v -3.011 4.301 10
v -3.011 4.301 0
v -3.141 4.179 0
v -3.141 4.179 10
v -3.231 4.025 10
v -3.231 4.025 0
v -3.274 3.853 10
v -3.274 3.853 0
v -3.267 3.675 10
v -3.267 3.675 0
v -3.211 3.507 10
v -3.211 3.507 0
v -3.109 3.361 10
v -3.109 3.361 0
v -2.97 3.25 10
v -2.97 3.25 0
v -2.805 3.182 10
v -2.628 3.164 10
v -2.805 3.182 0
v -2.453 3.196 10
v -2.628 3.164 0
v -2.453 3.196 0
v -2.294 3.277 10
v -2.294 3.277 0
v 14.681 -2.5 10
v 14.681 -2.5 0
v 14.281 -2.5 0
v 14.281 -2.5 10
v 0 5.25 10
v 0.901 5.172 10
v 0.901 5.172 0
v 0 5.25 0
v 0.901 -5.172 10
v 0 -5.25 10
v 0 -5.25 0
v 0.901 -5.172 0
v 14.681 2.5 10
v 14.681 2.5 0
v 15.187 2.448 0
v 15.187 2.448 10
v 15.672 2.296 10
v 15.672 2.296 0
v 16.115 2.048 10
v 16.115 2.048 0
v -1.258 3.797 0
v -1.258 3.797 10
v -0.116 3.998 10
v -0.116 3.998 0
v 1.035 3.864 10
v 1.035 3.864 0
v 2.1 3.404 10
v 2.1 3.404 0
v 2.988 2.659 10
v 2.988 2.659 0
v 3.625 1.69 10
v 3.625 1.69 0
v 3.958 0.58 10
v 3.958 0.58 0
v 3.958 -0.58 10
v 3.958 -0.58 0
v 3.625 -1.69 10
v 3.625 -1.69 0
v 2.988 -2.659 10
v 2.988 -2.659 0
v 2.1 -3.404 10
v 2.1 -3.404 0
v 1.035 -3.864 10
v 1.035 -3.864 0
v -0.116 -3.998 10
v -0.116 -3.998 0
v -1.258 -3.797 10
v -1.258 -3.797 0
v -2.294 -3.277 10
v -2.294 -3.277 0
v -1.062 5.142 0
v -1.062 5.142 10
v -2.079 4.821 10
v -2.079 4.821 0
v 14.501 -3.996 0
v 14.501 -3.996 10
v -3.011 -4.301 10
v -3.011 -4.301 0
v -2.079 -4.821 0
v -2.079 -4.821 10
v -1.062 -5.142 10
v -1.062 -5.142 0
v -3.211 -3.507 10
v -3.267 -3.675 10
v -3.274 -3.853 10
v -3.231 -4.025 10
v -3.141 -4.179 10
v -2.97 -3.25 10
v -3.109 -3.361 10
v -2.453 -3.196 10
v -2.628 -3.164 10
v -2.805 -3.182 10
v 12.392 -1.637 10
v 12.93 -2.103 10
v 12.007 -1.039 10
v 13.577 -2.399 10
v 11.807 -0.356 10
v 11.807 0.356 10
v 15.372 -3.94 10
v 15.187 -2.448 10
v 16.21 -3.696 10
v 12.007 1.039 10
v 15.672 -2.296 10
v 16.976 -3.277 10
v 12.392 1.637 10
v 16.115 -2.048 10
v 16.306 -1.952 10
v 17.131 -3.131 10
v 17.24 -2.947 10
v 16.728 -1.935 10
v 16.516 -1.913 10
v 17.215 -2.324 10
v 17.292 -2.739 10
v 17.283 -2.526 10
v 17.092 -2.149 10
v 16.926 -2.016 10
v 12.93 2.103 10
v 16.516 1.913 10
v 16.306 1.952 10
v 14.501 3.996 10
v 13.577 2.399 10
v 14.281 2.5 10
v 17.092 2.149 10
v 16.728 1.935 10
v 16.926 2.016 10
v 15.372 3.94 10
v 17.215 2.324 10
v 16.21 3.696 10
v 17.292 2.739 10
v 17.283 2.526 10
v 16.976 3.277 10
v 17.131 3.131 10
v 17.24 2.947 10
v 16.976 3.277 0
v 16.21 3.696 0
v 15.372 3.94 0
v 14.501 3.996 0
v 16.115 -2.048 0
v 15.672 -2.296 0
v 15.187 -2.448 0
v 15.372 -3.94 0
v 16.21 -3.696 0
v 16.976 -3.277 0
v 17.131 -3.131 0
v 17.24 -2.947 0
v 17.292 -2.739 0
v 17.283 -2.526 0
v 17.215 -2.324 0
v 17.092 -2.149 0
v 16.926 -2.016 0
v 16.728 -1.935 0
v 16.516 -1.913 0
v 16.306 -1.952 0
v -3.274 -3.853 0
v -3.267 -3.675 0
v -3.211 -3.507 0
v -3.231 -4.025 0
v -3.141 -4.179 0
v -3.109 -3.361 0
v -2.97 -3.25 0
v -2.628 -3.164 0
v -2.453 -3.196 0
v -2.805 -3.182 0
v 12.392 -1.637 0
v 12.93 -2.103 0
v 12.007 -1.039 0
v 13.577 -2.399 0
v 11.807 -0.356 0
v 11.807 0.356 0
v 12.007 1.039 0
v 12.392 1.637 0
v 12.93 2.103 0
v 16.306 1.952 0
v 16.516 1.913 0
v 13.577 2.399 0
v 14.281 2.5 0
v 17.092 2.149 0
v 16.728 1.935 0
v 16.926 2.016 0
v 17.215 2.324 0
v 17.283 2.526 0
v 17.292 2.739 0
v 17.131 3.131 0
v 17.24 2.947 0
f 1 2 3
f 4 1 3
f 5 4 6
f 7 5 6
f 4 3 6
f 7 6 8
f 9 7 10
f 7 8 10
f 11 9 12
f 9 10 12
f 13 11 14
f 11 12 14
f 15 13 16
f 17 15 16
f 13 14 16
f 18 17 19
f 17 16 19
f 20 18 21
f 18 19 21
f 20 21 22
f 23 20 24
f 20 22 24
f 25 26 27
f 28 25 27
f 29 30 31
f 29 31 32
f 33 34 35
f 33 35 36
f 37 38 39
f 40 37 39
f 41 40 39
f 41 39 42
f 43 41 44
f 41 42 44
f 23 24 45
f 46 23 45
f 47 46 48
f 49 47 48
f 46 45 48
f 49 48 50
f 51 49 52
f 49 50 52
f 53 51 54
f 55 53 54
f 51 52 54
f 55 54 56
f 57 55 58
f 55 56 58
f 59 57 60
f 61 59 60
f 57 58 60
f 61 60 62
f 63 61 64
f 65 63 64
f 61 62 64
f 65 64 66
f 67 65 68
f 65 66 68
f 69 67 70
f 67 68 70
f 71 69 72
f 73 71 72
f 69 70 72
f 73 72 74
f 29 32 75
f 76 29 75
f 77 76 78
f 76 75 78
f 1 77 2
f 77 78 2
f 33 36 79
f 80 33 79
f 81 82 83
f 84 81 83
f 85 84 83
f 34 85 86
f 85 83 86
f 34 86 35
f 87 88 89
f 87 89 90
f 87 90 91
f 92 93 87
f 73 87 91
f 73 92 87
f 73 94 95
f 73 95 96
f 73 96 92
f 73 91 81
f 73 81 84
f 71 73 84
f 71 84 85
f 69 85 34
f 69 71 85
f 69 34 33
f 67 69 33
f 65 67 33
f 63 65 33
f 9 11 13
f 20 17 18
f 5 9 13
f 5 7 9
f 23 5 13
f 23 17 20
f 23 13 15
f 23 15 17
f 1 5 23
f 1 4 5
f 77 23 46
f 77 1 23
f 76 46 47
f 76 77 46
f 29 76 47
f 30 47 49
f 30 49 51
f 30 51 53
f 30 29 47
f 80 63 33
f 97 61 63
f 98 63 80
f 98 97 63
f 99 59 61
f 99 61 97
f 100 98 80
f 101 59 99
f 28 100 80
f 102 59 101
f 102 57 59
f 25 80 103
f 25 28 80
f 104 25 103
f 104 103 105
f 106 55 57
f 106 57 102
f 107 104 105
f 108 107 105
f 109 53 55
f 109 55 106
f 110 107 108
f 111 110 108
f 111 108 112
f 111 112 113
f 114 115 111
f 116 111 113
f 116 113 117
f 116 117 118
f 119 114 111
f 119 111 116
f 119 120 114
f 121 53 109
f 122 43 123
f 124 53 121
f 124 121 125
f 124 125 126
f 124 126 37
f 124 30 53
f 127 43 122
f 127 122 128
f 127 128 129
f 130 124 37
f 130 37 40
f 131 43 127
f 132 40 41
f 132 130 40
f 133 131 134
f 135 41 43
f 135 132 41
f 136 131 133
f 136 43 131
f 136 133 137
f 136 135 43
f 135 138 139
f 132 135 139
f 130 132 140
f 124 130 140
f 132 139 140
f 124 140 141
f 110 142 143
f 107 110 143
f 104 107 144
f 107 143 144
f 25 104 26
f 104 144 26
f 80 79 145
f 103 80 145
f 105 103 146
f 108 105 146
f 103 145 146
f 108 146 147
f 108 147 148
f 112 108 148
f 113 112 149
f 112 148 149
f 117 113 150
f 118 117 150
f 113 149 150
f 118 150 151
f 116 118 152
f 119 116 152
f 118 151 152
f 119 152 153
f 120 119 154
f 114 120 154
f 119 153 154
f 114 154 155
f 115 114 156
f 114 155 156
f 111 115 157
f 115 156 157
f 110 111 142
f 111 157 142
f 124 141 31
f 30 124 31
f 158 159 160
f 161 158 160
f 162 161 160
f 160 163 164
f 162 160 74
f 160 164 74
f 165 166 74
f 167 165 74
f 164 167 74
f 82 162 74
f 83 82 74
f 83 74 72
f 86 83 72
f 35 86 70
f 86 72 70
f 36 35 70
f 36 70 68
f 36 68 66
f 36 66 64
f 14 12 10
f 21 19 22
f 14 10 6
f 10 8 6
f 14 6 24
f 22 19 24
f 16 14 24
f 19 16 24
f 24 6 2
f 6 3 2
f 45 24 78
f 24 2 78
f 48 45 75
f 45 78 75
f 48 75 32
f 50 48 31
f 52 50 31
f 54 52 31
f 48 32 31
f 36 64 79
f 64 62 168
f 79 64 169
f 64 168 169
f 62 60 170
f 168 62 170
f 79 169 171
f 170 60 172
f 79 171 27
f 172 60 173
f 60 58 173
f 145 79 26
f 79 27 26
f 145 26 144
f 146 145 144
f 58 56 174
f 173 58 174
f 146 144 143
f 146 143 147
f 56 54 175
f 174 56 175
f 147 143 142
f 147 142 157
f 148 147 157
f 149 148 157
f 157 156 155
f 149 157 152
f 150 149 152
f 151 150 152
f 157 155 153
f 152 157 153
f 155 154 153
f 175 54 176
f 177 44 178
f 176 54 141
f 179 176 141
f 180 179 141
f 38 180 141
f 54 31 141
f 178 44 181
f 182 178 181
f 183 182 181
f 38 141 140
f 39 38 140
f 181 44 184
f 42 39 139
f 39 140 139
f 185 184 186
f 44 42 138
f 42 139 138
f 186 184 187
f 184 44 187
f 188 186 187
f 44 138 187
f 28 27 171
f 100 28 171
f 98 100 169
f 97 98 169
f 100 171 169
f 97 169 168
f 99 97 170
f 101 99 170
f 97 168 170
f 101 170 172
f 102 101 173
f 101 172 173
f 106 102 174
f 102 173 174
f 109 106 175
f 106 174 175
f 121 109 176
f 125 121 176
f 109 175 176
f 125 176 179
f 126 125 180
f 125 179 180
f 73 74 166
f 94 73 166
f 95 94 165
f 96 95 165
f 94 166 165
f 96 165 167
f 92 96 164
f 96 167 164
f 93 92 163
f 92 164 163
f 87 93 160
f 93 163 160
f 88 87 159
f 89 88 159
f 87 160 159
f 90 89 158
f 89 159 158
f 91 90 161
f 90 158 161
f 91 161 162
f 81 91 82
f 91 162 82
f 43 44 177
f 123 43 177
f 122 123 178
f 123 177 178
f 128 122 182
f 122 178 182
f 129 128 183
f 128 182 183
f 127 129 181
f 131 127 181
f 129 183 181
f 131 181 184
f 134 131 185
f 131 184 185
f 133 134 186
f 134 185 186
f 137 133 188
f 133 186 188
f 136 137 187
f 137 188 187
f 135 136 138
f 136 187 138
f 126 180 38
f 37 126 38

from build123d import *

# Parameters (mm, degrees)
F1_DEPTH = 10


with BuildPart() as f1:
    # F0 (on Top) → F1 (new body)
    with BuildSketch(Plane.XY):
        with BuildLine():
            ThreePointArc((-2.294306, 3.276608), (4, 0), (-2.294306, -3.276608))
            ThreePointArc((-2.294306, -3.276608), (-3.164761, -3.430093), (-3.011276, -4.300548))
            ThreePointArc((-3.011276, -4.300548), (-1.578705, -5.007014), (0, -5.25))
            Line((0, -5.25), (0.901305, -5.172055))
            Line((0.901305, -5.172055), (14.501144, -3.995933))
            ThreePointArc((14.501144, -3.995933), (15.797979, -3.841018), (16.975782, -3.276608))
            ThreePointArc((16.975782, -3.276608), (17.159964, -2.232062), (16.115418, -2.04788))
            ThreePointArc((16.115418, -2.04788), (15.433241, -2.384292), (14.681476, -2.5))
            Line((14.681476, -2.5), (14.281476, -2.5))
            ThreePointArc((14.281476, -2.5), (11.781476, 0), (14.281476, 2.5))
            Line((14.281476, 2.5), (14.681476, 2.5))
            ThreePointArc((14.681476, 2.5), (15.433241, 2.384292), (16.115418, 2.04788))
            ThreePointArc((16.115418, 2.04788), (17.159964, 2.232062), (16.975782, 3.276608))
            ThreePointArc((16.975782, 3.276608), (15.797979, 3.841018), (14.501144, 3.995933))
            Line((14.501144, 3.995933), (0.901305, 5.172055))
            Line((0.901305, 5.172055), (0, 5.25))
            ThreePointArc((0, 5.25), (-1.578705, 5.007014), (-3.011276, 4.300548))
            ThreePointArc((-3.011276, 4.300548), (-3.164761, 3.430093), (-2.294306, 3.276608))
        make_face()
    extrude(amount=F1_DEPTH)


solid = f1.part
